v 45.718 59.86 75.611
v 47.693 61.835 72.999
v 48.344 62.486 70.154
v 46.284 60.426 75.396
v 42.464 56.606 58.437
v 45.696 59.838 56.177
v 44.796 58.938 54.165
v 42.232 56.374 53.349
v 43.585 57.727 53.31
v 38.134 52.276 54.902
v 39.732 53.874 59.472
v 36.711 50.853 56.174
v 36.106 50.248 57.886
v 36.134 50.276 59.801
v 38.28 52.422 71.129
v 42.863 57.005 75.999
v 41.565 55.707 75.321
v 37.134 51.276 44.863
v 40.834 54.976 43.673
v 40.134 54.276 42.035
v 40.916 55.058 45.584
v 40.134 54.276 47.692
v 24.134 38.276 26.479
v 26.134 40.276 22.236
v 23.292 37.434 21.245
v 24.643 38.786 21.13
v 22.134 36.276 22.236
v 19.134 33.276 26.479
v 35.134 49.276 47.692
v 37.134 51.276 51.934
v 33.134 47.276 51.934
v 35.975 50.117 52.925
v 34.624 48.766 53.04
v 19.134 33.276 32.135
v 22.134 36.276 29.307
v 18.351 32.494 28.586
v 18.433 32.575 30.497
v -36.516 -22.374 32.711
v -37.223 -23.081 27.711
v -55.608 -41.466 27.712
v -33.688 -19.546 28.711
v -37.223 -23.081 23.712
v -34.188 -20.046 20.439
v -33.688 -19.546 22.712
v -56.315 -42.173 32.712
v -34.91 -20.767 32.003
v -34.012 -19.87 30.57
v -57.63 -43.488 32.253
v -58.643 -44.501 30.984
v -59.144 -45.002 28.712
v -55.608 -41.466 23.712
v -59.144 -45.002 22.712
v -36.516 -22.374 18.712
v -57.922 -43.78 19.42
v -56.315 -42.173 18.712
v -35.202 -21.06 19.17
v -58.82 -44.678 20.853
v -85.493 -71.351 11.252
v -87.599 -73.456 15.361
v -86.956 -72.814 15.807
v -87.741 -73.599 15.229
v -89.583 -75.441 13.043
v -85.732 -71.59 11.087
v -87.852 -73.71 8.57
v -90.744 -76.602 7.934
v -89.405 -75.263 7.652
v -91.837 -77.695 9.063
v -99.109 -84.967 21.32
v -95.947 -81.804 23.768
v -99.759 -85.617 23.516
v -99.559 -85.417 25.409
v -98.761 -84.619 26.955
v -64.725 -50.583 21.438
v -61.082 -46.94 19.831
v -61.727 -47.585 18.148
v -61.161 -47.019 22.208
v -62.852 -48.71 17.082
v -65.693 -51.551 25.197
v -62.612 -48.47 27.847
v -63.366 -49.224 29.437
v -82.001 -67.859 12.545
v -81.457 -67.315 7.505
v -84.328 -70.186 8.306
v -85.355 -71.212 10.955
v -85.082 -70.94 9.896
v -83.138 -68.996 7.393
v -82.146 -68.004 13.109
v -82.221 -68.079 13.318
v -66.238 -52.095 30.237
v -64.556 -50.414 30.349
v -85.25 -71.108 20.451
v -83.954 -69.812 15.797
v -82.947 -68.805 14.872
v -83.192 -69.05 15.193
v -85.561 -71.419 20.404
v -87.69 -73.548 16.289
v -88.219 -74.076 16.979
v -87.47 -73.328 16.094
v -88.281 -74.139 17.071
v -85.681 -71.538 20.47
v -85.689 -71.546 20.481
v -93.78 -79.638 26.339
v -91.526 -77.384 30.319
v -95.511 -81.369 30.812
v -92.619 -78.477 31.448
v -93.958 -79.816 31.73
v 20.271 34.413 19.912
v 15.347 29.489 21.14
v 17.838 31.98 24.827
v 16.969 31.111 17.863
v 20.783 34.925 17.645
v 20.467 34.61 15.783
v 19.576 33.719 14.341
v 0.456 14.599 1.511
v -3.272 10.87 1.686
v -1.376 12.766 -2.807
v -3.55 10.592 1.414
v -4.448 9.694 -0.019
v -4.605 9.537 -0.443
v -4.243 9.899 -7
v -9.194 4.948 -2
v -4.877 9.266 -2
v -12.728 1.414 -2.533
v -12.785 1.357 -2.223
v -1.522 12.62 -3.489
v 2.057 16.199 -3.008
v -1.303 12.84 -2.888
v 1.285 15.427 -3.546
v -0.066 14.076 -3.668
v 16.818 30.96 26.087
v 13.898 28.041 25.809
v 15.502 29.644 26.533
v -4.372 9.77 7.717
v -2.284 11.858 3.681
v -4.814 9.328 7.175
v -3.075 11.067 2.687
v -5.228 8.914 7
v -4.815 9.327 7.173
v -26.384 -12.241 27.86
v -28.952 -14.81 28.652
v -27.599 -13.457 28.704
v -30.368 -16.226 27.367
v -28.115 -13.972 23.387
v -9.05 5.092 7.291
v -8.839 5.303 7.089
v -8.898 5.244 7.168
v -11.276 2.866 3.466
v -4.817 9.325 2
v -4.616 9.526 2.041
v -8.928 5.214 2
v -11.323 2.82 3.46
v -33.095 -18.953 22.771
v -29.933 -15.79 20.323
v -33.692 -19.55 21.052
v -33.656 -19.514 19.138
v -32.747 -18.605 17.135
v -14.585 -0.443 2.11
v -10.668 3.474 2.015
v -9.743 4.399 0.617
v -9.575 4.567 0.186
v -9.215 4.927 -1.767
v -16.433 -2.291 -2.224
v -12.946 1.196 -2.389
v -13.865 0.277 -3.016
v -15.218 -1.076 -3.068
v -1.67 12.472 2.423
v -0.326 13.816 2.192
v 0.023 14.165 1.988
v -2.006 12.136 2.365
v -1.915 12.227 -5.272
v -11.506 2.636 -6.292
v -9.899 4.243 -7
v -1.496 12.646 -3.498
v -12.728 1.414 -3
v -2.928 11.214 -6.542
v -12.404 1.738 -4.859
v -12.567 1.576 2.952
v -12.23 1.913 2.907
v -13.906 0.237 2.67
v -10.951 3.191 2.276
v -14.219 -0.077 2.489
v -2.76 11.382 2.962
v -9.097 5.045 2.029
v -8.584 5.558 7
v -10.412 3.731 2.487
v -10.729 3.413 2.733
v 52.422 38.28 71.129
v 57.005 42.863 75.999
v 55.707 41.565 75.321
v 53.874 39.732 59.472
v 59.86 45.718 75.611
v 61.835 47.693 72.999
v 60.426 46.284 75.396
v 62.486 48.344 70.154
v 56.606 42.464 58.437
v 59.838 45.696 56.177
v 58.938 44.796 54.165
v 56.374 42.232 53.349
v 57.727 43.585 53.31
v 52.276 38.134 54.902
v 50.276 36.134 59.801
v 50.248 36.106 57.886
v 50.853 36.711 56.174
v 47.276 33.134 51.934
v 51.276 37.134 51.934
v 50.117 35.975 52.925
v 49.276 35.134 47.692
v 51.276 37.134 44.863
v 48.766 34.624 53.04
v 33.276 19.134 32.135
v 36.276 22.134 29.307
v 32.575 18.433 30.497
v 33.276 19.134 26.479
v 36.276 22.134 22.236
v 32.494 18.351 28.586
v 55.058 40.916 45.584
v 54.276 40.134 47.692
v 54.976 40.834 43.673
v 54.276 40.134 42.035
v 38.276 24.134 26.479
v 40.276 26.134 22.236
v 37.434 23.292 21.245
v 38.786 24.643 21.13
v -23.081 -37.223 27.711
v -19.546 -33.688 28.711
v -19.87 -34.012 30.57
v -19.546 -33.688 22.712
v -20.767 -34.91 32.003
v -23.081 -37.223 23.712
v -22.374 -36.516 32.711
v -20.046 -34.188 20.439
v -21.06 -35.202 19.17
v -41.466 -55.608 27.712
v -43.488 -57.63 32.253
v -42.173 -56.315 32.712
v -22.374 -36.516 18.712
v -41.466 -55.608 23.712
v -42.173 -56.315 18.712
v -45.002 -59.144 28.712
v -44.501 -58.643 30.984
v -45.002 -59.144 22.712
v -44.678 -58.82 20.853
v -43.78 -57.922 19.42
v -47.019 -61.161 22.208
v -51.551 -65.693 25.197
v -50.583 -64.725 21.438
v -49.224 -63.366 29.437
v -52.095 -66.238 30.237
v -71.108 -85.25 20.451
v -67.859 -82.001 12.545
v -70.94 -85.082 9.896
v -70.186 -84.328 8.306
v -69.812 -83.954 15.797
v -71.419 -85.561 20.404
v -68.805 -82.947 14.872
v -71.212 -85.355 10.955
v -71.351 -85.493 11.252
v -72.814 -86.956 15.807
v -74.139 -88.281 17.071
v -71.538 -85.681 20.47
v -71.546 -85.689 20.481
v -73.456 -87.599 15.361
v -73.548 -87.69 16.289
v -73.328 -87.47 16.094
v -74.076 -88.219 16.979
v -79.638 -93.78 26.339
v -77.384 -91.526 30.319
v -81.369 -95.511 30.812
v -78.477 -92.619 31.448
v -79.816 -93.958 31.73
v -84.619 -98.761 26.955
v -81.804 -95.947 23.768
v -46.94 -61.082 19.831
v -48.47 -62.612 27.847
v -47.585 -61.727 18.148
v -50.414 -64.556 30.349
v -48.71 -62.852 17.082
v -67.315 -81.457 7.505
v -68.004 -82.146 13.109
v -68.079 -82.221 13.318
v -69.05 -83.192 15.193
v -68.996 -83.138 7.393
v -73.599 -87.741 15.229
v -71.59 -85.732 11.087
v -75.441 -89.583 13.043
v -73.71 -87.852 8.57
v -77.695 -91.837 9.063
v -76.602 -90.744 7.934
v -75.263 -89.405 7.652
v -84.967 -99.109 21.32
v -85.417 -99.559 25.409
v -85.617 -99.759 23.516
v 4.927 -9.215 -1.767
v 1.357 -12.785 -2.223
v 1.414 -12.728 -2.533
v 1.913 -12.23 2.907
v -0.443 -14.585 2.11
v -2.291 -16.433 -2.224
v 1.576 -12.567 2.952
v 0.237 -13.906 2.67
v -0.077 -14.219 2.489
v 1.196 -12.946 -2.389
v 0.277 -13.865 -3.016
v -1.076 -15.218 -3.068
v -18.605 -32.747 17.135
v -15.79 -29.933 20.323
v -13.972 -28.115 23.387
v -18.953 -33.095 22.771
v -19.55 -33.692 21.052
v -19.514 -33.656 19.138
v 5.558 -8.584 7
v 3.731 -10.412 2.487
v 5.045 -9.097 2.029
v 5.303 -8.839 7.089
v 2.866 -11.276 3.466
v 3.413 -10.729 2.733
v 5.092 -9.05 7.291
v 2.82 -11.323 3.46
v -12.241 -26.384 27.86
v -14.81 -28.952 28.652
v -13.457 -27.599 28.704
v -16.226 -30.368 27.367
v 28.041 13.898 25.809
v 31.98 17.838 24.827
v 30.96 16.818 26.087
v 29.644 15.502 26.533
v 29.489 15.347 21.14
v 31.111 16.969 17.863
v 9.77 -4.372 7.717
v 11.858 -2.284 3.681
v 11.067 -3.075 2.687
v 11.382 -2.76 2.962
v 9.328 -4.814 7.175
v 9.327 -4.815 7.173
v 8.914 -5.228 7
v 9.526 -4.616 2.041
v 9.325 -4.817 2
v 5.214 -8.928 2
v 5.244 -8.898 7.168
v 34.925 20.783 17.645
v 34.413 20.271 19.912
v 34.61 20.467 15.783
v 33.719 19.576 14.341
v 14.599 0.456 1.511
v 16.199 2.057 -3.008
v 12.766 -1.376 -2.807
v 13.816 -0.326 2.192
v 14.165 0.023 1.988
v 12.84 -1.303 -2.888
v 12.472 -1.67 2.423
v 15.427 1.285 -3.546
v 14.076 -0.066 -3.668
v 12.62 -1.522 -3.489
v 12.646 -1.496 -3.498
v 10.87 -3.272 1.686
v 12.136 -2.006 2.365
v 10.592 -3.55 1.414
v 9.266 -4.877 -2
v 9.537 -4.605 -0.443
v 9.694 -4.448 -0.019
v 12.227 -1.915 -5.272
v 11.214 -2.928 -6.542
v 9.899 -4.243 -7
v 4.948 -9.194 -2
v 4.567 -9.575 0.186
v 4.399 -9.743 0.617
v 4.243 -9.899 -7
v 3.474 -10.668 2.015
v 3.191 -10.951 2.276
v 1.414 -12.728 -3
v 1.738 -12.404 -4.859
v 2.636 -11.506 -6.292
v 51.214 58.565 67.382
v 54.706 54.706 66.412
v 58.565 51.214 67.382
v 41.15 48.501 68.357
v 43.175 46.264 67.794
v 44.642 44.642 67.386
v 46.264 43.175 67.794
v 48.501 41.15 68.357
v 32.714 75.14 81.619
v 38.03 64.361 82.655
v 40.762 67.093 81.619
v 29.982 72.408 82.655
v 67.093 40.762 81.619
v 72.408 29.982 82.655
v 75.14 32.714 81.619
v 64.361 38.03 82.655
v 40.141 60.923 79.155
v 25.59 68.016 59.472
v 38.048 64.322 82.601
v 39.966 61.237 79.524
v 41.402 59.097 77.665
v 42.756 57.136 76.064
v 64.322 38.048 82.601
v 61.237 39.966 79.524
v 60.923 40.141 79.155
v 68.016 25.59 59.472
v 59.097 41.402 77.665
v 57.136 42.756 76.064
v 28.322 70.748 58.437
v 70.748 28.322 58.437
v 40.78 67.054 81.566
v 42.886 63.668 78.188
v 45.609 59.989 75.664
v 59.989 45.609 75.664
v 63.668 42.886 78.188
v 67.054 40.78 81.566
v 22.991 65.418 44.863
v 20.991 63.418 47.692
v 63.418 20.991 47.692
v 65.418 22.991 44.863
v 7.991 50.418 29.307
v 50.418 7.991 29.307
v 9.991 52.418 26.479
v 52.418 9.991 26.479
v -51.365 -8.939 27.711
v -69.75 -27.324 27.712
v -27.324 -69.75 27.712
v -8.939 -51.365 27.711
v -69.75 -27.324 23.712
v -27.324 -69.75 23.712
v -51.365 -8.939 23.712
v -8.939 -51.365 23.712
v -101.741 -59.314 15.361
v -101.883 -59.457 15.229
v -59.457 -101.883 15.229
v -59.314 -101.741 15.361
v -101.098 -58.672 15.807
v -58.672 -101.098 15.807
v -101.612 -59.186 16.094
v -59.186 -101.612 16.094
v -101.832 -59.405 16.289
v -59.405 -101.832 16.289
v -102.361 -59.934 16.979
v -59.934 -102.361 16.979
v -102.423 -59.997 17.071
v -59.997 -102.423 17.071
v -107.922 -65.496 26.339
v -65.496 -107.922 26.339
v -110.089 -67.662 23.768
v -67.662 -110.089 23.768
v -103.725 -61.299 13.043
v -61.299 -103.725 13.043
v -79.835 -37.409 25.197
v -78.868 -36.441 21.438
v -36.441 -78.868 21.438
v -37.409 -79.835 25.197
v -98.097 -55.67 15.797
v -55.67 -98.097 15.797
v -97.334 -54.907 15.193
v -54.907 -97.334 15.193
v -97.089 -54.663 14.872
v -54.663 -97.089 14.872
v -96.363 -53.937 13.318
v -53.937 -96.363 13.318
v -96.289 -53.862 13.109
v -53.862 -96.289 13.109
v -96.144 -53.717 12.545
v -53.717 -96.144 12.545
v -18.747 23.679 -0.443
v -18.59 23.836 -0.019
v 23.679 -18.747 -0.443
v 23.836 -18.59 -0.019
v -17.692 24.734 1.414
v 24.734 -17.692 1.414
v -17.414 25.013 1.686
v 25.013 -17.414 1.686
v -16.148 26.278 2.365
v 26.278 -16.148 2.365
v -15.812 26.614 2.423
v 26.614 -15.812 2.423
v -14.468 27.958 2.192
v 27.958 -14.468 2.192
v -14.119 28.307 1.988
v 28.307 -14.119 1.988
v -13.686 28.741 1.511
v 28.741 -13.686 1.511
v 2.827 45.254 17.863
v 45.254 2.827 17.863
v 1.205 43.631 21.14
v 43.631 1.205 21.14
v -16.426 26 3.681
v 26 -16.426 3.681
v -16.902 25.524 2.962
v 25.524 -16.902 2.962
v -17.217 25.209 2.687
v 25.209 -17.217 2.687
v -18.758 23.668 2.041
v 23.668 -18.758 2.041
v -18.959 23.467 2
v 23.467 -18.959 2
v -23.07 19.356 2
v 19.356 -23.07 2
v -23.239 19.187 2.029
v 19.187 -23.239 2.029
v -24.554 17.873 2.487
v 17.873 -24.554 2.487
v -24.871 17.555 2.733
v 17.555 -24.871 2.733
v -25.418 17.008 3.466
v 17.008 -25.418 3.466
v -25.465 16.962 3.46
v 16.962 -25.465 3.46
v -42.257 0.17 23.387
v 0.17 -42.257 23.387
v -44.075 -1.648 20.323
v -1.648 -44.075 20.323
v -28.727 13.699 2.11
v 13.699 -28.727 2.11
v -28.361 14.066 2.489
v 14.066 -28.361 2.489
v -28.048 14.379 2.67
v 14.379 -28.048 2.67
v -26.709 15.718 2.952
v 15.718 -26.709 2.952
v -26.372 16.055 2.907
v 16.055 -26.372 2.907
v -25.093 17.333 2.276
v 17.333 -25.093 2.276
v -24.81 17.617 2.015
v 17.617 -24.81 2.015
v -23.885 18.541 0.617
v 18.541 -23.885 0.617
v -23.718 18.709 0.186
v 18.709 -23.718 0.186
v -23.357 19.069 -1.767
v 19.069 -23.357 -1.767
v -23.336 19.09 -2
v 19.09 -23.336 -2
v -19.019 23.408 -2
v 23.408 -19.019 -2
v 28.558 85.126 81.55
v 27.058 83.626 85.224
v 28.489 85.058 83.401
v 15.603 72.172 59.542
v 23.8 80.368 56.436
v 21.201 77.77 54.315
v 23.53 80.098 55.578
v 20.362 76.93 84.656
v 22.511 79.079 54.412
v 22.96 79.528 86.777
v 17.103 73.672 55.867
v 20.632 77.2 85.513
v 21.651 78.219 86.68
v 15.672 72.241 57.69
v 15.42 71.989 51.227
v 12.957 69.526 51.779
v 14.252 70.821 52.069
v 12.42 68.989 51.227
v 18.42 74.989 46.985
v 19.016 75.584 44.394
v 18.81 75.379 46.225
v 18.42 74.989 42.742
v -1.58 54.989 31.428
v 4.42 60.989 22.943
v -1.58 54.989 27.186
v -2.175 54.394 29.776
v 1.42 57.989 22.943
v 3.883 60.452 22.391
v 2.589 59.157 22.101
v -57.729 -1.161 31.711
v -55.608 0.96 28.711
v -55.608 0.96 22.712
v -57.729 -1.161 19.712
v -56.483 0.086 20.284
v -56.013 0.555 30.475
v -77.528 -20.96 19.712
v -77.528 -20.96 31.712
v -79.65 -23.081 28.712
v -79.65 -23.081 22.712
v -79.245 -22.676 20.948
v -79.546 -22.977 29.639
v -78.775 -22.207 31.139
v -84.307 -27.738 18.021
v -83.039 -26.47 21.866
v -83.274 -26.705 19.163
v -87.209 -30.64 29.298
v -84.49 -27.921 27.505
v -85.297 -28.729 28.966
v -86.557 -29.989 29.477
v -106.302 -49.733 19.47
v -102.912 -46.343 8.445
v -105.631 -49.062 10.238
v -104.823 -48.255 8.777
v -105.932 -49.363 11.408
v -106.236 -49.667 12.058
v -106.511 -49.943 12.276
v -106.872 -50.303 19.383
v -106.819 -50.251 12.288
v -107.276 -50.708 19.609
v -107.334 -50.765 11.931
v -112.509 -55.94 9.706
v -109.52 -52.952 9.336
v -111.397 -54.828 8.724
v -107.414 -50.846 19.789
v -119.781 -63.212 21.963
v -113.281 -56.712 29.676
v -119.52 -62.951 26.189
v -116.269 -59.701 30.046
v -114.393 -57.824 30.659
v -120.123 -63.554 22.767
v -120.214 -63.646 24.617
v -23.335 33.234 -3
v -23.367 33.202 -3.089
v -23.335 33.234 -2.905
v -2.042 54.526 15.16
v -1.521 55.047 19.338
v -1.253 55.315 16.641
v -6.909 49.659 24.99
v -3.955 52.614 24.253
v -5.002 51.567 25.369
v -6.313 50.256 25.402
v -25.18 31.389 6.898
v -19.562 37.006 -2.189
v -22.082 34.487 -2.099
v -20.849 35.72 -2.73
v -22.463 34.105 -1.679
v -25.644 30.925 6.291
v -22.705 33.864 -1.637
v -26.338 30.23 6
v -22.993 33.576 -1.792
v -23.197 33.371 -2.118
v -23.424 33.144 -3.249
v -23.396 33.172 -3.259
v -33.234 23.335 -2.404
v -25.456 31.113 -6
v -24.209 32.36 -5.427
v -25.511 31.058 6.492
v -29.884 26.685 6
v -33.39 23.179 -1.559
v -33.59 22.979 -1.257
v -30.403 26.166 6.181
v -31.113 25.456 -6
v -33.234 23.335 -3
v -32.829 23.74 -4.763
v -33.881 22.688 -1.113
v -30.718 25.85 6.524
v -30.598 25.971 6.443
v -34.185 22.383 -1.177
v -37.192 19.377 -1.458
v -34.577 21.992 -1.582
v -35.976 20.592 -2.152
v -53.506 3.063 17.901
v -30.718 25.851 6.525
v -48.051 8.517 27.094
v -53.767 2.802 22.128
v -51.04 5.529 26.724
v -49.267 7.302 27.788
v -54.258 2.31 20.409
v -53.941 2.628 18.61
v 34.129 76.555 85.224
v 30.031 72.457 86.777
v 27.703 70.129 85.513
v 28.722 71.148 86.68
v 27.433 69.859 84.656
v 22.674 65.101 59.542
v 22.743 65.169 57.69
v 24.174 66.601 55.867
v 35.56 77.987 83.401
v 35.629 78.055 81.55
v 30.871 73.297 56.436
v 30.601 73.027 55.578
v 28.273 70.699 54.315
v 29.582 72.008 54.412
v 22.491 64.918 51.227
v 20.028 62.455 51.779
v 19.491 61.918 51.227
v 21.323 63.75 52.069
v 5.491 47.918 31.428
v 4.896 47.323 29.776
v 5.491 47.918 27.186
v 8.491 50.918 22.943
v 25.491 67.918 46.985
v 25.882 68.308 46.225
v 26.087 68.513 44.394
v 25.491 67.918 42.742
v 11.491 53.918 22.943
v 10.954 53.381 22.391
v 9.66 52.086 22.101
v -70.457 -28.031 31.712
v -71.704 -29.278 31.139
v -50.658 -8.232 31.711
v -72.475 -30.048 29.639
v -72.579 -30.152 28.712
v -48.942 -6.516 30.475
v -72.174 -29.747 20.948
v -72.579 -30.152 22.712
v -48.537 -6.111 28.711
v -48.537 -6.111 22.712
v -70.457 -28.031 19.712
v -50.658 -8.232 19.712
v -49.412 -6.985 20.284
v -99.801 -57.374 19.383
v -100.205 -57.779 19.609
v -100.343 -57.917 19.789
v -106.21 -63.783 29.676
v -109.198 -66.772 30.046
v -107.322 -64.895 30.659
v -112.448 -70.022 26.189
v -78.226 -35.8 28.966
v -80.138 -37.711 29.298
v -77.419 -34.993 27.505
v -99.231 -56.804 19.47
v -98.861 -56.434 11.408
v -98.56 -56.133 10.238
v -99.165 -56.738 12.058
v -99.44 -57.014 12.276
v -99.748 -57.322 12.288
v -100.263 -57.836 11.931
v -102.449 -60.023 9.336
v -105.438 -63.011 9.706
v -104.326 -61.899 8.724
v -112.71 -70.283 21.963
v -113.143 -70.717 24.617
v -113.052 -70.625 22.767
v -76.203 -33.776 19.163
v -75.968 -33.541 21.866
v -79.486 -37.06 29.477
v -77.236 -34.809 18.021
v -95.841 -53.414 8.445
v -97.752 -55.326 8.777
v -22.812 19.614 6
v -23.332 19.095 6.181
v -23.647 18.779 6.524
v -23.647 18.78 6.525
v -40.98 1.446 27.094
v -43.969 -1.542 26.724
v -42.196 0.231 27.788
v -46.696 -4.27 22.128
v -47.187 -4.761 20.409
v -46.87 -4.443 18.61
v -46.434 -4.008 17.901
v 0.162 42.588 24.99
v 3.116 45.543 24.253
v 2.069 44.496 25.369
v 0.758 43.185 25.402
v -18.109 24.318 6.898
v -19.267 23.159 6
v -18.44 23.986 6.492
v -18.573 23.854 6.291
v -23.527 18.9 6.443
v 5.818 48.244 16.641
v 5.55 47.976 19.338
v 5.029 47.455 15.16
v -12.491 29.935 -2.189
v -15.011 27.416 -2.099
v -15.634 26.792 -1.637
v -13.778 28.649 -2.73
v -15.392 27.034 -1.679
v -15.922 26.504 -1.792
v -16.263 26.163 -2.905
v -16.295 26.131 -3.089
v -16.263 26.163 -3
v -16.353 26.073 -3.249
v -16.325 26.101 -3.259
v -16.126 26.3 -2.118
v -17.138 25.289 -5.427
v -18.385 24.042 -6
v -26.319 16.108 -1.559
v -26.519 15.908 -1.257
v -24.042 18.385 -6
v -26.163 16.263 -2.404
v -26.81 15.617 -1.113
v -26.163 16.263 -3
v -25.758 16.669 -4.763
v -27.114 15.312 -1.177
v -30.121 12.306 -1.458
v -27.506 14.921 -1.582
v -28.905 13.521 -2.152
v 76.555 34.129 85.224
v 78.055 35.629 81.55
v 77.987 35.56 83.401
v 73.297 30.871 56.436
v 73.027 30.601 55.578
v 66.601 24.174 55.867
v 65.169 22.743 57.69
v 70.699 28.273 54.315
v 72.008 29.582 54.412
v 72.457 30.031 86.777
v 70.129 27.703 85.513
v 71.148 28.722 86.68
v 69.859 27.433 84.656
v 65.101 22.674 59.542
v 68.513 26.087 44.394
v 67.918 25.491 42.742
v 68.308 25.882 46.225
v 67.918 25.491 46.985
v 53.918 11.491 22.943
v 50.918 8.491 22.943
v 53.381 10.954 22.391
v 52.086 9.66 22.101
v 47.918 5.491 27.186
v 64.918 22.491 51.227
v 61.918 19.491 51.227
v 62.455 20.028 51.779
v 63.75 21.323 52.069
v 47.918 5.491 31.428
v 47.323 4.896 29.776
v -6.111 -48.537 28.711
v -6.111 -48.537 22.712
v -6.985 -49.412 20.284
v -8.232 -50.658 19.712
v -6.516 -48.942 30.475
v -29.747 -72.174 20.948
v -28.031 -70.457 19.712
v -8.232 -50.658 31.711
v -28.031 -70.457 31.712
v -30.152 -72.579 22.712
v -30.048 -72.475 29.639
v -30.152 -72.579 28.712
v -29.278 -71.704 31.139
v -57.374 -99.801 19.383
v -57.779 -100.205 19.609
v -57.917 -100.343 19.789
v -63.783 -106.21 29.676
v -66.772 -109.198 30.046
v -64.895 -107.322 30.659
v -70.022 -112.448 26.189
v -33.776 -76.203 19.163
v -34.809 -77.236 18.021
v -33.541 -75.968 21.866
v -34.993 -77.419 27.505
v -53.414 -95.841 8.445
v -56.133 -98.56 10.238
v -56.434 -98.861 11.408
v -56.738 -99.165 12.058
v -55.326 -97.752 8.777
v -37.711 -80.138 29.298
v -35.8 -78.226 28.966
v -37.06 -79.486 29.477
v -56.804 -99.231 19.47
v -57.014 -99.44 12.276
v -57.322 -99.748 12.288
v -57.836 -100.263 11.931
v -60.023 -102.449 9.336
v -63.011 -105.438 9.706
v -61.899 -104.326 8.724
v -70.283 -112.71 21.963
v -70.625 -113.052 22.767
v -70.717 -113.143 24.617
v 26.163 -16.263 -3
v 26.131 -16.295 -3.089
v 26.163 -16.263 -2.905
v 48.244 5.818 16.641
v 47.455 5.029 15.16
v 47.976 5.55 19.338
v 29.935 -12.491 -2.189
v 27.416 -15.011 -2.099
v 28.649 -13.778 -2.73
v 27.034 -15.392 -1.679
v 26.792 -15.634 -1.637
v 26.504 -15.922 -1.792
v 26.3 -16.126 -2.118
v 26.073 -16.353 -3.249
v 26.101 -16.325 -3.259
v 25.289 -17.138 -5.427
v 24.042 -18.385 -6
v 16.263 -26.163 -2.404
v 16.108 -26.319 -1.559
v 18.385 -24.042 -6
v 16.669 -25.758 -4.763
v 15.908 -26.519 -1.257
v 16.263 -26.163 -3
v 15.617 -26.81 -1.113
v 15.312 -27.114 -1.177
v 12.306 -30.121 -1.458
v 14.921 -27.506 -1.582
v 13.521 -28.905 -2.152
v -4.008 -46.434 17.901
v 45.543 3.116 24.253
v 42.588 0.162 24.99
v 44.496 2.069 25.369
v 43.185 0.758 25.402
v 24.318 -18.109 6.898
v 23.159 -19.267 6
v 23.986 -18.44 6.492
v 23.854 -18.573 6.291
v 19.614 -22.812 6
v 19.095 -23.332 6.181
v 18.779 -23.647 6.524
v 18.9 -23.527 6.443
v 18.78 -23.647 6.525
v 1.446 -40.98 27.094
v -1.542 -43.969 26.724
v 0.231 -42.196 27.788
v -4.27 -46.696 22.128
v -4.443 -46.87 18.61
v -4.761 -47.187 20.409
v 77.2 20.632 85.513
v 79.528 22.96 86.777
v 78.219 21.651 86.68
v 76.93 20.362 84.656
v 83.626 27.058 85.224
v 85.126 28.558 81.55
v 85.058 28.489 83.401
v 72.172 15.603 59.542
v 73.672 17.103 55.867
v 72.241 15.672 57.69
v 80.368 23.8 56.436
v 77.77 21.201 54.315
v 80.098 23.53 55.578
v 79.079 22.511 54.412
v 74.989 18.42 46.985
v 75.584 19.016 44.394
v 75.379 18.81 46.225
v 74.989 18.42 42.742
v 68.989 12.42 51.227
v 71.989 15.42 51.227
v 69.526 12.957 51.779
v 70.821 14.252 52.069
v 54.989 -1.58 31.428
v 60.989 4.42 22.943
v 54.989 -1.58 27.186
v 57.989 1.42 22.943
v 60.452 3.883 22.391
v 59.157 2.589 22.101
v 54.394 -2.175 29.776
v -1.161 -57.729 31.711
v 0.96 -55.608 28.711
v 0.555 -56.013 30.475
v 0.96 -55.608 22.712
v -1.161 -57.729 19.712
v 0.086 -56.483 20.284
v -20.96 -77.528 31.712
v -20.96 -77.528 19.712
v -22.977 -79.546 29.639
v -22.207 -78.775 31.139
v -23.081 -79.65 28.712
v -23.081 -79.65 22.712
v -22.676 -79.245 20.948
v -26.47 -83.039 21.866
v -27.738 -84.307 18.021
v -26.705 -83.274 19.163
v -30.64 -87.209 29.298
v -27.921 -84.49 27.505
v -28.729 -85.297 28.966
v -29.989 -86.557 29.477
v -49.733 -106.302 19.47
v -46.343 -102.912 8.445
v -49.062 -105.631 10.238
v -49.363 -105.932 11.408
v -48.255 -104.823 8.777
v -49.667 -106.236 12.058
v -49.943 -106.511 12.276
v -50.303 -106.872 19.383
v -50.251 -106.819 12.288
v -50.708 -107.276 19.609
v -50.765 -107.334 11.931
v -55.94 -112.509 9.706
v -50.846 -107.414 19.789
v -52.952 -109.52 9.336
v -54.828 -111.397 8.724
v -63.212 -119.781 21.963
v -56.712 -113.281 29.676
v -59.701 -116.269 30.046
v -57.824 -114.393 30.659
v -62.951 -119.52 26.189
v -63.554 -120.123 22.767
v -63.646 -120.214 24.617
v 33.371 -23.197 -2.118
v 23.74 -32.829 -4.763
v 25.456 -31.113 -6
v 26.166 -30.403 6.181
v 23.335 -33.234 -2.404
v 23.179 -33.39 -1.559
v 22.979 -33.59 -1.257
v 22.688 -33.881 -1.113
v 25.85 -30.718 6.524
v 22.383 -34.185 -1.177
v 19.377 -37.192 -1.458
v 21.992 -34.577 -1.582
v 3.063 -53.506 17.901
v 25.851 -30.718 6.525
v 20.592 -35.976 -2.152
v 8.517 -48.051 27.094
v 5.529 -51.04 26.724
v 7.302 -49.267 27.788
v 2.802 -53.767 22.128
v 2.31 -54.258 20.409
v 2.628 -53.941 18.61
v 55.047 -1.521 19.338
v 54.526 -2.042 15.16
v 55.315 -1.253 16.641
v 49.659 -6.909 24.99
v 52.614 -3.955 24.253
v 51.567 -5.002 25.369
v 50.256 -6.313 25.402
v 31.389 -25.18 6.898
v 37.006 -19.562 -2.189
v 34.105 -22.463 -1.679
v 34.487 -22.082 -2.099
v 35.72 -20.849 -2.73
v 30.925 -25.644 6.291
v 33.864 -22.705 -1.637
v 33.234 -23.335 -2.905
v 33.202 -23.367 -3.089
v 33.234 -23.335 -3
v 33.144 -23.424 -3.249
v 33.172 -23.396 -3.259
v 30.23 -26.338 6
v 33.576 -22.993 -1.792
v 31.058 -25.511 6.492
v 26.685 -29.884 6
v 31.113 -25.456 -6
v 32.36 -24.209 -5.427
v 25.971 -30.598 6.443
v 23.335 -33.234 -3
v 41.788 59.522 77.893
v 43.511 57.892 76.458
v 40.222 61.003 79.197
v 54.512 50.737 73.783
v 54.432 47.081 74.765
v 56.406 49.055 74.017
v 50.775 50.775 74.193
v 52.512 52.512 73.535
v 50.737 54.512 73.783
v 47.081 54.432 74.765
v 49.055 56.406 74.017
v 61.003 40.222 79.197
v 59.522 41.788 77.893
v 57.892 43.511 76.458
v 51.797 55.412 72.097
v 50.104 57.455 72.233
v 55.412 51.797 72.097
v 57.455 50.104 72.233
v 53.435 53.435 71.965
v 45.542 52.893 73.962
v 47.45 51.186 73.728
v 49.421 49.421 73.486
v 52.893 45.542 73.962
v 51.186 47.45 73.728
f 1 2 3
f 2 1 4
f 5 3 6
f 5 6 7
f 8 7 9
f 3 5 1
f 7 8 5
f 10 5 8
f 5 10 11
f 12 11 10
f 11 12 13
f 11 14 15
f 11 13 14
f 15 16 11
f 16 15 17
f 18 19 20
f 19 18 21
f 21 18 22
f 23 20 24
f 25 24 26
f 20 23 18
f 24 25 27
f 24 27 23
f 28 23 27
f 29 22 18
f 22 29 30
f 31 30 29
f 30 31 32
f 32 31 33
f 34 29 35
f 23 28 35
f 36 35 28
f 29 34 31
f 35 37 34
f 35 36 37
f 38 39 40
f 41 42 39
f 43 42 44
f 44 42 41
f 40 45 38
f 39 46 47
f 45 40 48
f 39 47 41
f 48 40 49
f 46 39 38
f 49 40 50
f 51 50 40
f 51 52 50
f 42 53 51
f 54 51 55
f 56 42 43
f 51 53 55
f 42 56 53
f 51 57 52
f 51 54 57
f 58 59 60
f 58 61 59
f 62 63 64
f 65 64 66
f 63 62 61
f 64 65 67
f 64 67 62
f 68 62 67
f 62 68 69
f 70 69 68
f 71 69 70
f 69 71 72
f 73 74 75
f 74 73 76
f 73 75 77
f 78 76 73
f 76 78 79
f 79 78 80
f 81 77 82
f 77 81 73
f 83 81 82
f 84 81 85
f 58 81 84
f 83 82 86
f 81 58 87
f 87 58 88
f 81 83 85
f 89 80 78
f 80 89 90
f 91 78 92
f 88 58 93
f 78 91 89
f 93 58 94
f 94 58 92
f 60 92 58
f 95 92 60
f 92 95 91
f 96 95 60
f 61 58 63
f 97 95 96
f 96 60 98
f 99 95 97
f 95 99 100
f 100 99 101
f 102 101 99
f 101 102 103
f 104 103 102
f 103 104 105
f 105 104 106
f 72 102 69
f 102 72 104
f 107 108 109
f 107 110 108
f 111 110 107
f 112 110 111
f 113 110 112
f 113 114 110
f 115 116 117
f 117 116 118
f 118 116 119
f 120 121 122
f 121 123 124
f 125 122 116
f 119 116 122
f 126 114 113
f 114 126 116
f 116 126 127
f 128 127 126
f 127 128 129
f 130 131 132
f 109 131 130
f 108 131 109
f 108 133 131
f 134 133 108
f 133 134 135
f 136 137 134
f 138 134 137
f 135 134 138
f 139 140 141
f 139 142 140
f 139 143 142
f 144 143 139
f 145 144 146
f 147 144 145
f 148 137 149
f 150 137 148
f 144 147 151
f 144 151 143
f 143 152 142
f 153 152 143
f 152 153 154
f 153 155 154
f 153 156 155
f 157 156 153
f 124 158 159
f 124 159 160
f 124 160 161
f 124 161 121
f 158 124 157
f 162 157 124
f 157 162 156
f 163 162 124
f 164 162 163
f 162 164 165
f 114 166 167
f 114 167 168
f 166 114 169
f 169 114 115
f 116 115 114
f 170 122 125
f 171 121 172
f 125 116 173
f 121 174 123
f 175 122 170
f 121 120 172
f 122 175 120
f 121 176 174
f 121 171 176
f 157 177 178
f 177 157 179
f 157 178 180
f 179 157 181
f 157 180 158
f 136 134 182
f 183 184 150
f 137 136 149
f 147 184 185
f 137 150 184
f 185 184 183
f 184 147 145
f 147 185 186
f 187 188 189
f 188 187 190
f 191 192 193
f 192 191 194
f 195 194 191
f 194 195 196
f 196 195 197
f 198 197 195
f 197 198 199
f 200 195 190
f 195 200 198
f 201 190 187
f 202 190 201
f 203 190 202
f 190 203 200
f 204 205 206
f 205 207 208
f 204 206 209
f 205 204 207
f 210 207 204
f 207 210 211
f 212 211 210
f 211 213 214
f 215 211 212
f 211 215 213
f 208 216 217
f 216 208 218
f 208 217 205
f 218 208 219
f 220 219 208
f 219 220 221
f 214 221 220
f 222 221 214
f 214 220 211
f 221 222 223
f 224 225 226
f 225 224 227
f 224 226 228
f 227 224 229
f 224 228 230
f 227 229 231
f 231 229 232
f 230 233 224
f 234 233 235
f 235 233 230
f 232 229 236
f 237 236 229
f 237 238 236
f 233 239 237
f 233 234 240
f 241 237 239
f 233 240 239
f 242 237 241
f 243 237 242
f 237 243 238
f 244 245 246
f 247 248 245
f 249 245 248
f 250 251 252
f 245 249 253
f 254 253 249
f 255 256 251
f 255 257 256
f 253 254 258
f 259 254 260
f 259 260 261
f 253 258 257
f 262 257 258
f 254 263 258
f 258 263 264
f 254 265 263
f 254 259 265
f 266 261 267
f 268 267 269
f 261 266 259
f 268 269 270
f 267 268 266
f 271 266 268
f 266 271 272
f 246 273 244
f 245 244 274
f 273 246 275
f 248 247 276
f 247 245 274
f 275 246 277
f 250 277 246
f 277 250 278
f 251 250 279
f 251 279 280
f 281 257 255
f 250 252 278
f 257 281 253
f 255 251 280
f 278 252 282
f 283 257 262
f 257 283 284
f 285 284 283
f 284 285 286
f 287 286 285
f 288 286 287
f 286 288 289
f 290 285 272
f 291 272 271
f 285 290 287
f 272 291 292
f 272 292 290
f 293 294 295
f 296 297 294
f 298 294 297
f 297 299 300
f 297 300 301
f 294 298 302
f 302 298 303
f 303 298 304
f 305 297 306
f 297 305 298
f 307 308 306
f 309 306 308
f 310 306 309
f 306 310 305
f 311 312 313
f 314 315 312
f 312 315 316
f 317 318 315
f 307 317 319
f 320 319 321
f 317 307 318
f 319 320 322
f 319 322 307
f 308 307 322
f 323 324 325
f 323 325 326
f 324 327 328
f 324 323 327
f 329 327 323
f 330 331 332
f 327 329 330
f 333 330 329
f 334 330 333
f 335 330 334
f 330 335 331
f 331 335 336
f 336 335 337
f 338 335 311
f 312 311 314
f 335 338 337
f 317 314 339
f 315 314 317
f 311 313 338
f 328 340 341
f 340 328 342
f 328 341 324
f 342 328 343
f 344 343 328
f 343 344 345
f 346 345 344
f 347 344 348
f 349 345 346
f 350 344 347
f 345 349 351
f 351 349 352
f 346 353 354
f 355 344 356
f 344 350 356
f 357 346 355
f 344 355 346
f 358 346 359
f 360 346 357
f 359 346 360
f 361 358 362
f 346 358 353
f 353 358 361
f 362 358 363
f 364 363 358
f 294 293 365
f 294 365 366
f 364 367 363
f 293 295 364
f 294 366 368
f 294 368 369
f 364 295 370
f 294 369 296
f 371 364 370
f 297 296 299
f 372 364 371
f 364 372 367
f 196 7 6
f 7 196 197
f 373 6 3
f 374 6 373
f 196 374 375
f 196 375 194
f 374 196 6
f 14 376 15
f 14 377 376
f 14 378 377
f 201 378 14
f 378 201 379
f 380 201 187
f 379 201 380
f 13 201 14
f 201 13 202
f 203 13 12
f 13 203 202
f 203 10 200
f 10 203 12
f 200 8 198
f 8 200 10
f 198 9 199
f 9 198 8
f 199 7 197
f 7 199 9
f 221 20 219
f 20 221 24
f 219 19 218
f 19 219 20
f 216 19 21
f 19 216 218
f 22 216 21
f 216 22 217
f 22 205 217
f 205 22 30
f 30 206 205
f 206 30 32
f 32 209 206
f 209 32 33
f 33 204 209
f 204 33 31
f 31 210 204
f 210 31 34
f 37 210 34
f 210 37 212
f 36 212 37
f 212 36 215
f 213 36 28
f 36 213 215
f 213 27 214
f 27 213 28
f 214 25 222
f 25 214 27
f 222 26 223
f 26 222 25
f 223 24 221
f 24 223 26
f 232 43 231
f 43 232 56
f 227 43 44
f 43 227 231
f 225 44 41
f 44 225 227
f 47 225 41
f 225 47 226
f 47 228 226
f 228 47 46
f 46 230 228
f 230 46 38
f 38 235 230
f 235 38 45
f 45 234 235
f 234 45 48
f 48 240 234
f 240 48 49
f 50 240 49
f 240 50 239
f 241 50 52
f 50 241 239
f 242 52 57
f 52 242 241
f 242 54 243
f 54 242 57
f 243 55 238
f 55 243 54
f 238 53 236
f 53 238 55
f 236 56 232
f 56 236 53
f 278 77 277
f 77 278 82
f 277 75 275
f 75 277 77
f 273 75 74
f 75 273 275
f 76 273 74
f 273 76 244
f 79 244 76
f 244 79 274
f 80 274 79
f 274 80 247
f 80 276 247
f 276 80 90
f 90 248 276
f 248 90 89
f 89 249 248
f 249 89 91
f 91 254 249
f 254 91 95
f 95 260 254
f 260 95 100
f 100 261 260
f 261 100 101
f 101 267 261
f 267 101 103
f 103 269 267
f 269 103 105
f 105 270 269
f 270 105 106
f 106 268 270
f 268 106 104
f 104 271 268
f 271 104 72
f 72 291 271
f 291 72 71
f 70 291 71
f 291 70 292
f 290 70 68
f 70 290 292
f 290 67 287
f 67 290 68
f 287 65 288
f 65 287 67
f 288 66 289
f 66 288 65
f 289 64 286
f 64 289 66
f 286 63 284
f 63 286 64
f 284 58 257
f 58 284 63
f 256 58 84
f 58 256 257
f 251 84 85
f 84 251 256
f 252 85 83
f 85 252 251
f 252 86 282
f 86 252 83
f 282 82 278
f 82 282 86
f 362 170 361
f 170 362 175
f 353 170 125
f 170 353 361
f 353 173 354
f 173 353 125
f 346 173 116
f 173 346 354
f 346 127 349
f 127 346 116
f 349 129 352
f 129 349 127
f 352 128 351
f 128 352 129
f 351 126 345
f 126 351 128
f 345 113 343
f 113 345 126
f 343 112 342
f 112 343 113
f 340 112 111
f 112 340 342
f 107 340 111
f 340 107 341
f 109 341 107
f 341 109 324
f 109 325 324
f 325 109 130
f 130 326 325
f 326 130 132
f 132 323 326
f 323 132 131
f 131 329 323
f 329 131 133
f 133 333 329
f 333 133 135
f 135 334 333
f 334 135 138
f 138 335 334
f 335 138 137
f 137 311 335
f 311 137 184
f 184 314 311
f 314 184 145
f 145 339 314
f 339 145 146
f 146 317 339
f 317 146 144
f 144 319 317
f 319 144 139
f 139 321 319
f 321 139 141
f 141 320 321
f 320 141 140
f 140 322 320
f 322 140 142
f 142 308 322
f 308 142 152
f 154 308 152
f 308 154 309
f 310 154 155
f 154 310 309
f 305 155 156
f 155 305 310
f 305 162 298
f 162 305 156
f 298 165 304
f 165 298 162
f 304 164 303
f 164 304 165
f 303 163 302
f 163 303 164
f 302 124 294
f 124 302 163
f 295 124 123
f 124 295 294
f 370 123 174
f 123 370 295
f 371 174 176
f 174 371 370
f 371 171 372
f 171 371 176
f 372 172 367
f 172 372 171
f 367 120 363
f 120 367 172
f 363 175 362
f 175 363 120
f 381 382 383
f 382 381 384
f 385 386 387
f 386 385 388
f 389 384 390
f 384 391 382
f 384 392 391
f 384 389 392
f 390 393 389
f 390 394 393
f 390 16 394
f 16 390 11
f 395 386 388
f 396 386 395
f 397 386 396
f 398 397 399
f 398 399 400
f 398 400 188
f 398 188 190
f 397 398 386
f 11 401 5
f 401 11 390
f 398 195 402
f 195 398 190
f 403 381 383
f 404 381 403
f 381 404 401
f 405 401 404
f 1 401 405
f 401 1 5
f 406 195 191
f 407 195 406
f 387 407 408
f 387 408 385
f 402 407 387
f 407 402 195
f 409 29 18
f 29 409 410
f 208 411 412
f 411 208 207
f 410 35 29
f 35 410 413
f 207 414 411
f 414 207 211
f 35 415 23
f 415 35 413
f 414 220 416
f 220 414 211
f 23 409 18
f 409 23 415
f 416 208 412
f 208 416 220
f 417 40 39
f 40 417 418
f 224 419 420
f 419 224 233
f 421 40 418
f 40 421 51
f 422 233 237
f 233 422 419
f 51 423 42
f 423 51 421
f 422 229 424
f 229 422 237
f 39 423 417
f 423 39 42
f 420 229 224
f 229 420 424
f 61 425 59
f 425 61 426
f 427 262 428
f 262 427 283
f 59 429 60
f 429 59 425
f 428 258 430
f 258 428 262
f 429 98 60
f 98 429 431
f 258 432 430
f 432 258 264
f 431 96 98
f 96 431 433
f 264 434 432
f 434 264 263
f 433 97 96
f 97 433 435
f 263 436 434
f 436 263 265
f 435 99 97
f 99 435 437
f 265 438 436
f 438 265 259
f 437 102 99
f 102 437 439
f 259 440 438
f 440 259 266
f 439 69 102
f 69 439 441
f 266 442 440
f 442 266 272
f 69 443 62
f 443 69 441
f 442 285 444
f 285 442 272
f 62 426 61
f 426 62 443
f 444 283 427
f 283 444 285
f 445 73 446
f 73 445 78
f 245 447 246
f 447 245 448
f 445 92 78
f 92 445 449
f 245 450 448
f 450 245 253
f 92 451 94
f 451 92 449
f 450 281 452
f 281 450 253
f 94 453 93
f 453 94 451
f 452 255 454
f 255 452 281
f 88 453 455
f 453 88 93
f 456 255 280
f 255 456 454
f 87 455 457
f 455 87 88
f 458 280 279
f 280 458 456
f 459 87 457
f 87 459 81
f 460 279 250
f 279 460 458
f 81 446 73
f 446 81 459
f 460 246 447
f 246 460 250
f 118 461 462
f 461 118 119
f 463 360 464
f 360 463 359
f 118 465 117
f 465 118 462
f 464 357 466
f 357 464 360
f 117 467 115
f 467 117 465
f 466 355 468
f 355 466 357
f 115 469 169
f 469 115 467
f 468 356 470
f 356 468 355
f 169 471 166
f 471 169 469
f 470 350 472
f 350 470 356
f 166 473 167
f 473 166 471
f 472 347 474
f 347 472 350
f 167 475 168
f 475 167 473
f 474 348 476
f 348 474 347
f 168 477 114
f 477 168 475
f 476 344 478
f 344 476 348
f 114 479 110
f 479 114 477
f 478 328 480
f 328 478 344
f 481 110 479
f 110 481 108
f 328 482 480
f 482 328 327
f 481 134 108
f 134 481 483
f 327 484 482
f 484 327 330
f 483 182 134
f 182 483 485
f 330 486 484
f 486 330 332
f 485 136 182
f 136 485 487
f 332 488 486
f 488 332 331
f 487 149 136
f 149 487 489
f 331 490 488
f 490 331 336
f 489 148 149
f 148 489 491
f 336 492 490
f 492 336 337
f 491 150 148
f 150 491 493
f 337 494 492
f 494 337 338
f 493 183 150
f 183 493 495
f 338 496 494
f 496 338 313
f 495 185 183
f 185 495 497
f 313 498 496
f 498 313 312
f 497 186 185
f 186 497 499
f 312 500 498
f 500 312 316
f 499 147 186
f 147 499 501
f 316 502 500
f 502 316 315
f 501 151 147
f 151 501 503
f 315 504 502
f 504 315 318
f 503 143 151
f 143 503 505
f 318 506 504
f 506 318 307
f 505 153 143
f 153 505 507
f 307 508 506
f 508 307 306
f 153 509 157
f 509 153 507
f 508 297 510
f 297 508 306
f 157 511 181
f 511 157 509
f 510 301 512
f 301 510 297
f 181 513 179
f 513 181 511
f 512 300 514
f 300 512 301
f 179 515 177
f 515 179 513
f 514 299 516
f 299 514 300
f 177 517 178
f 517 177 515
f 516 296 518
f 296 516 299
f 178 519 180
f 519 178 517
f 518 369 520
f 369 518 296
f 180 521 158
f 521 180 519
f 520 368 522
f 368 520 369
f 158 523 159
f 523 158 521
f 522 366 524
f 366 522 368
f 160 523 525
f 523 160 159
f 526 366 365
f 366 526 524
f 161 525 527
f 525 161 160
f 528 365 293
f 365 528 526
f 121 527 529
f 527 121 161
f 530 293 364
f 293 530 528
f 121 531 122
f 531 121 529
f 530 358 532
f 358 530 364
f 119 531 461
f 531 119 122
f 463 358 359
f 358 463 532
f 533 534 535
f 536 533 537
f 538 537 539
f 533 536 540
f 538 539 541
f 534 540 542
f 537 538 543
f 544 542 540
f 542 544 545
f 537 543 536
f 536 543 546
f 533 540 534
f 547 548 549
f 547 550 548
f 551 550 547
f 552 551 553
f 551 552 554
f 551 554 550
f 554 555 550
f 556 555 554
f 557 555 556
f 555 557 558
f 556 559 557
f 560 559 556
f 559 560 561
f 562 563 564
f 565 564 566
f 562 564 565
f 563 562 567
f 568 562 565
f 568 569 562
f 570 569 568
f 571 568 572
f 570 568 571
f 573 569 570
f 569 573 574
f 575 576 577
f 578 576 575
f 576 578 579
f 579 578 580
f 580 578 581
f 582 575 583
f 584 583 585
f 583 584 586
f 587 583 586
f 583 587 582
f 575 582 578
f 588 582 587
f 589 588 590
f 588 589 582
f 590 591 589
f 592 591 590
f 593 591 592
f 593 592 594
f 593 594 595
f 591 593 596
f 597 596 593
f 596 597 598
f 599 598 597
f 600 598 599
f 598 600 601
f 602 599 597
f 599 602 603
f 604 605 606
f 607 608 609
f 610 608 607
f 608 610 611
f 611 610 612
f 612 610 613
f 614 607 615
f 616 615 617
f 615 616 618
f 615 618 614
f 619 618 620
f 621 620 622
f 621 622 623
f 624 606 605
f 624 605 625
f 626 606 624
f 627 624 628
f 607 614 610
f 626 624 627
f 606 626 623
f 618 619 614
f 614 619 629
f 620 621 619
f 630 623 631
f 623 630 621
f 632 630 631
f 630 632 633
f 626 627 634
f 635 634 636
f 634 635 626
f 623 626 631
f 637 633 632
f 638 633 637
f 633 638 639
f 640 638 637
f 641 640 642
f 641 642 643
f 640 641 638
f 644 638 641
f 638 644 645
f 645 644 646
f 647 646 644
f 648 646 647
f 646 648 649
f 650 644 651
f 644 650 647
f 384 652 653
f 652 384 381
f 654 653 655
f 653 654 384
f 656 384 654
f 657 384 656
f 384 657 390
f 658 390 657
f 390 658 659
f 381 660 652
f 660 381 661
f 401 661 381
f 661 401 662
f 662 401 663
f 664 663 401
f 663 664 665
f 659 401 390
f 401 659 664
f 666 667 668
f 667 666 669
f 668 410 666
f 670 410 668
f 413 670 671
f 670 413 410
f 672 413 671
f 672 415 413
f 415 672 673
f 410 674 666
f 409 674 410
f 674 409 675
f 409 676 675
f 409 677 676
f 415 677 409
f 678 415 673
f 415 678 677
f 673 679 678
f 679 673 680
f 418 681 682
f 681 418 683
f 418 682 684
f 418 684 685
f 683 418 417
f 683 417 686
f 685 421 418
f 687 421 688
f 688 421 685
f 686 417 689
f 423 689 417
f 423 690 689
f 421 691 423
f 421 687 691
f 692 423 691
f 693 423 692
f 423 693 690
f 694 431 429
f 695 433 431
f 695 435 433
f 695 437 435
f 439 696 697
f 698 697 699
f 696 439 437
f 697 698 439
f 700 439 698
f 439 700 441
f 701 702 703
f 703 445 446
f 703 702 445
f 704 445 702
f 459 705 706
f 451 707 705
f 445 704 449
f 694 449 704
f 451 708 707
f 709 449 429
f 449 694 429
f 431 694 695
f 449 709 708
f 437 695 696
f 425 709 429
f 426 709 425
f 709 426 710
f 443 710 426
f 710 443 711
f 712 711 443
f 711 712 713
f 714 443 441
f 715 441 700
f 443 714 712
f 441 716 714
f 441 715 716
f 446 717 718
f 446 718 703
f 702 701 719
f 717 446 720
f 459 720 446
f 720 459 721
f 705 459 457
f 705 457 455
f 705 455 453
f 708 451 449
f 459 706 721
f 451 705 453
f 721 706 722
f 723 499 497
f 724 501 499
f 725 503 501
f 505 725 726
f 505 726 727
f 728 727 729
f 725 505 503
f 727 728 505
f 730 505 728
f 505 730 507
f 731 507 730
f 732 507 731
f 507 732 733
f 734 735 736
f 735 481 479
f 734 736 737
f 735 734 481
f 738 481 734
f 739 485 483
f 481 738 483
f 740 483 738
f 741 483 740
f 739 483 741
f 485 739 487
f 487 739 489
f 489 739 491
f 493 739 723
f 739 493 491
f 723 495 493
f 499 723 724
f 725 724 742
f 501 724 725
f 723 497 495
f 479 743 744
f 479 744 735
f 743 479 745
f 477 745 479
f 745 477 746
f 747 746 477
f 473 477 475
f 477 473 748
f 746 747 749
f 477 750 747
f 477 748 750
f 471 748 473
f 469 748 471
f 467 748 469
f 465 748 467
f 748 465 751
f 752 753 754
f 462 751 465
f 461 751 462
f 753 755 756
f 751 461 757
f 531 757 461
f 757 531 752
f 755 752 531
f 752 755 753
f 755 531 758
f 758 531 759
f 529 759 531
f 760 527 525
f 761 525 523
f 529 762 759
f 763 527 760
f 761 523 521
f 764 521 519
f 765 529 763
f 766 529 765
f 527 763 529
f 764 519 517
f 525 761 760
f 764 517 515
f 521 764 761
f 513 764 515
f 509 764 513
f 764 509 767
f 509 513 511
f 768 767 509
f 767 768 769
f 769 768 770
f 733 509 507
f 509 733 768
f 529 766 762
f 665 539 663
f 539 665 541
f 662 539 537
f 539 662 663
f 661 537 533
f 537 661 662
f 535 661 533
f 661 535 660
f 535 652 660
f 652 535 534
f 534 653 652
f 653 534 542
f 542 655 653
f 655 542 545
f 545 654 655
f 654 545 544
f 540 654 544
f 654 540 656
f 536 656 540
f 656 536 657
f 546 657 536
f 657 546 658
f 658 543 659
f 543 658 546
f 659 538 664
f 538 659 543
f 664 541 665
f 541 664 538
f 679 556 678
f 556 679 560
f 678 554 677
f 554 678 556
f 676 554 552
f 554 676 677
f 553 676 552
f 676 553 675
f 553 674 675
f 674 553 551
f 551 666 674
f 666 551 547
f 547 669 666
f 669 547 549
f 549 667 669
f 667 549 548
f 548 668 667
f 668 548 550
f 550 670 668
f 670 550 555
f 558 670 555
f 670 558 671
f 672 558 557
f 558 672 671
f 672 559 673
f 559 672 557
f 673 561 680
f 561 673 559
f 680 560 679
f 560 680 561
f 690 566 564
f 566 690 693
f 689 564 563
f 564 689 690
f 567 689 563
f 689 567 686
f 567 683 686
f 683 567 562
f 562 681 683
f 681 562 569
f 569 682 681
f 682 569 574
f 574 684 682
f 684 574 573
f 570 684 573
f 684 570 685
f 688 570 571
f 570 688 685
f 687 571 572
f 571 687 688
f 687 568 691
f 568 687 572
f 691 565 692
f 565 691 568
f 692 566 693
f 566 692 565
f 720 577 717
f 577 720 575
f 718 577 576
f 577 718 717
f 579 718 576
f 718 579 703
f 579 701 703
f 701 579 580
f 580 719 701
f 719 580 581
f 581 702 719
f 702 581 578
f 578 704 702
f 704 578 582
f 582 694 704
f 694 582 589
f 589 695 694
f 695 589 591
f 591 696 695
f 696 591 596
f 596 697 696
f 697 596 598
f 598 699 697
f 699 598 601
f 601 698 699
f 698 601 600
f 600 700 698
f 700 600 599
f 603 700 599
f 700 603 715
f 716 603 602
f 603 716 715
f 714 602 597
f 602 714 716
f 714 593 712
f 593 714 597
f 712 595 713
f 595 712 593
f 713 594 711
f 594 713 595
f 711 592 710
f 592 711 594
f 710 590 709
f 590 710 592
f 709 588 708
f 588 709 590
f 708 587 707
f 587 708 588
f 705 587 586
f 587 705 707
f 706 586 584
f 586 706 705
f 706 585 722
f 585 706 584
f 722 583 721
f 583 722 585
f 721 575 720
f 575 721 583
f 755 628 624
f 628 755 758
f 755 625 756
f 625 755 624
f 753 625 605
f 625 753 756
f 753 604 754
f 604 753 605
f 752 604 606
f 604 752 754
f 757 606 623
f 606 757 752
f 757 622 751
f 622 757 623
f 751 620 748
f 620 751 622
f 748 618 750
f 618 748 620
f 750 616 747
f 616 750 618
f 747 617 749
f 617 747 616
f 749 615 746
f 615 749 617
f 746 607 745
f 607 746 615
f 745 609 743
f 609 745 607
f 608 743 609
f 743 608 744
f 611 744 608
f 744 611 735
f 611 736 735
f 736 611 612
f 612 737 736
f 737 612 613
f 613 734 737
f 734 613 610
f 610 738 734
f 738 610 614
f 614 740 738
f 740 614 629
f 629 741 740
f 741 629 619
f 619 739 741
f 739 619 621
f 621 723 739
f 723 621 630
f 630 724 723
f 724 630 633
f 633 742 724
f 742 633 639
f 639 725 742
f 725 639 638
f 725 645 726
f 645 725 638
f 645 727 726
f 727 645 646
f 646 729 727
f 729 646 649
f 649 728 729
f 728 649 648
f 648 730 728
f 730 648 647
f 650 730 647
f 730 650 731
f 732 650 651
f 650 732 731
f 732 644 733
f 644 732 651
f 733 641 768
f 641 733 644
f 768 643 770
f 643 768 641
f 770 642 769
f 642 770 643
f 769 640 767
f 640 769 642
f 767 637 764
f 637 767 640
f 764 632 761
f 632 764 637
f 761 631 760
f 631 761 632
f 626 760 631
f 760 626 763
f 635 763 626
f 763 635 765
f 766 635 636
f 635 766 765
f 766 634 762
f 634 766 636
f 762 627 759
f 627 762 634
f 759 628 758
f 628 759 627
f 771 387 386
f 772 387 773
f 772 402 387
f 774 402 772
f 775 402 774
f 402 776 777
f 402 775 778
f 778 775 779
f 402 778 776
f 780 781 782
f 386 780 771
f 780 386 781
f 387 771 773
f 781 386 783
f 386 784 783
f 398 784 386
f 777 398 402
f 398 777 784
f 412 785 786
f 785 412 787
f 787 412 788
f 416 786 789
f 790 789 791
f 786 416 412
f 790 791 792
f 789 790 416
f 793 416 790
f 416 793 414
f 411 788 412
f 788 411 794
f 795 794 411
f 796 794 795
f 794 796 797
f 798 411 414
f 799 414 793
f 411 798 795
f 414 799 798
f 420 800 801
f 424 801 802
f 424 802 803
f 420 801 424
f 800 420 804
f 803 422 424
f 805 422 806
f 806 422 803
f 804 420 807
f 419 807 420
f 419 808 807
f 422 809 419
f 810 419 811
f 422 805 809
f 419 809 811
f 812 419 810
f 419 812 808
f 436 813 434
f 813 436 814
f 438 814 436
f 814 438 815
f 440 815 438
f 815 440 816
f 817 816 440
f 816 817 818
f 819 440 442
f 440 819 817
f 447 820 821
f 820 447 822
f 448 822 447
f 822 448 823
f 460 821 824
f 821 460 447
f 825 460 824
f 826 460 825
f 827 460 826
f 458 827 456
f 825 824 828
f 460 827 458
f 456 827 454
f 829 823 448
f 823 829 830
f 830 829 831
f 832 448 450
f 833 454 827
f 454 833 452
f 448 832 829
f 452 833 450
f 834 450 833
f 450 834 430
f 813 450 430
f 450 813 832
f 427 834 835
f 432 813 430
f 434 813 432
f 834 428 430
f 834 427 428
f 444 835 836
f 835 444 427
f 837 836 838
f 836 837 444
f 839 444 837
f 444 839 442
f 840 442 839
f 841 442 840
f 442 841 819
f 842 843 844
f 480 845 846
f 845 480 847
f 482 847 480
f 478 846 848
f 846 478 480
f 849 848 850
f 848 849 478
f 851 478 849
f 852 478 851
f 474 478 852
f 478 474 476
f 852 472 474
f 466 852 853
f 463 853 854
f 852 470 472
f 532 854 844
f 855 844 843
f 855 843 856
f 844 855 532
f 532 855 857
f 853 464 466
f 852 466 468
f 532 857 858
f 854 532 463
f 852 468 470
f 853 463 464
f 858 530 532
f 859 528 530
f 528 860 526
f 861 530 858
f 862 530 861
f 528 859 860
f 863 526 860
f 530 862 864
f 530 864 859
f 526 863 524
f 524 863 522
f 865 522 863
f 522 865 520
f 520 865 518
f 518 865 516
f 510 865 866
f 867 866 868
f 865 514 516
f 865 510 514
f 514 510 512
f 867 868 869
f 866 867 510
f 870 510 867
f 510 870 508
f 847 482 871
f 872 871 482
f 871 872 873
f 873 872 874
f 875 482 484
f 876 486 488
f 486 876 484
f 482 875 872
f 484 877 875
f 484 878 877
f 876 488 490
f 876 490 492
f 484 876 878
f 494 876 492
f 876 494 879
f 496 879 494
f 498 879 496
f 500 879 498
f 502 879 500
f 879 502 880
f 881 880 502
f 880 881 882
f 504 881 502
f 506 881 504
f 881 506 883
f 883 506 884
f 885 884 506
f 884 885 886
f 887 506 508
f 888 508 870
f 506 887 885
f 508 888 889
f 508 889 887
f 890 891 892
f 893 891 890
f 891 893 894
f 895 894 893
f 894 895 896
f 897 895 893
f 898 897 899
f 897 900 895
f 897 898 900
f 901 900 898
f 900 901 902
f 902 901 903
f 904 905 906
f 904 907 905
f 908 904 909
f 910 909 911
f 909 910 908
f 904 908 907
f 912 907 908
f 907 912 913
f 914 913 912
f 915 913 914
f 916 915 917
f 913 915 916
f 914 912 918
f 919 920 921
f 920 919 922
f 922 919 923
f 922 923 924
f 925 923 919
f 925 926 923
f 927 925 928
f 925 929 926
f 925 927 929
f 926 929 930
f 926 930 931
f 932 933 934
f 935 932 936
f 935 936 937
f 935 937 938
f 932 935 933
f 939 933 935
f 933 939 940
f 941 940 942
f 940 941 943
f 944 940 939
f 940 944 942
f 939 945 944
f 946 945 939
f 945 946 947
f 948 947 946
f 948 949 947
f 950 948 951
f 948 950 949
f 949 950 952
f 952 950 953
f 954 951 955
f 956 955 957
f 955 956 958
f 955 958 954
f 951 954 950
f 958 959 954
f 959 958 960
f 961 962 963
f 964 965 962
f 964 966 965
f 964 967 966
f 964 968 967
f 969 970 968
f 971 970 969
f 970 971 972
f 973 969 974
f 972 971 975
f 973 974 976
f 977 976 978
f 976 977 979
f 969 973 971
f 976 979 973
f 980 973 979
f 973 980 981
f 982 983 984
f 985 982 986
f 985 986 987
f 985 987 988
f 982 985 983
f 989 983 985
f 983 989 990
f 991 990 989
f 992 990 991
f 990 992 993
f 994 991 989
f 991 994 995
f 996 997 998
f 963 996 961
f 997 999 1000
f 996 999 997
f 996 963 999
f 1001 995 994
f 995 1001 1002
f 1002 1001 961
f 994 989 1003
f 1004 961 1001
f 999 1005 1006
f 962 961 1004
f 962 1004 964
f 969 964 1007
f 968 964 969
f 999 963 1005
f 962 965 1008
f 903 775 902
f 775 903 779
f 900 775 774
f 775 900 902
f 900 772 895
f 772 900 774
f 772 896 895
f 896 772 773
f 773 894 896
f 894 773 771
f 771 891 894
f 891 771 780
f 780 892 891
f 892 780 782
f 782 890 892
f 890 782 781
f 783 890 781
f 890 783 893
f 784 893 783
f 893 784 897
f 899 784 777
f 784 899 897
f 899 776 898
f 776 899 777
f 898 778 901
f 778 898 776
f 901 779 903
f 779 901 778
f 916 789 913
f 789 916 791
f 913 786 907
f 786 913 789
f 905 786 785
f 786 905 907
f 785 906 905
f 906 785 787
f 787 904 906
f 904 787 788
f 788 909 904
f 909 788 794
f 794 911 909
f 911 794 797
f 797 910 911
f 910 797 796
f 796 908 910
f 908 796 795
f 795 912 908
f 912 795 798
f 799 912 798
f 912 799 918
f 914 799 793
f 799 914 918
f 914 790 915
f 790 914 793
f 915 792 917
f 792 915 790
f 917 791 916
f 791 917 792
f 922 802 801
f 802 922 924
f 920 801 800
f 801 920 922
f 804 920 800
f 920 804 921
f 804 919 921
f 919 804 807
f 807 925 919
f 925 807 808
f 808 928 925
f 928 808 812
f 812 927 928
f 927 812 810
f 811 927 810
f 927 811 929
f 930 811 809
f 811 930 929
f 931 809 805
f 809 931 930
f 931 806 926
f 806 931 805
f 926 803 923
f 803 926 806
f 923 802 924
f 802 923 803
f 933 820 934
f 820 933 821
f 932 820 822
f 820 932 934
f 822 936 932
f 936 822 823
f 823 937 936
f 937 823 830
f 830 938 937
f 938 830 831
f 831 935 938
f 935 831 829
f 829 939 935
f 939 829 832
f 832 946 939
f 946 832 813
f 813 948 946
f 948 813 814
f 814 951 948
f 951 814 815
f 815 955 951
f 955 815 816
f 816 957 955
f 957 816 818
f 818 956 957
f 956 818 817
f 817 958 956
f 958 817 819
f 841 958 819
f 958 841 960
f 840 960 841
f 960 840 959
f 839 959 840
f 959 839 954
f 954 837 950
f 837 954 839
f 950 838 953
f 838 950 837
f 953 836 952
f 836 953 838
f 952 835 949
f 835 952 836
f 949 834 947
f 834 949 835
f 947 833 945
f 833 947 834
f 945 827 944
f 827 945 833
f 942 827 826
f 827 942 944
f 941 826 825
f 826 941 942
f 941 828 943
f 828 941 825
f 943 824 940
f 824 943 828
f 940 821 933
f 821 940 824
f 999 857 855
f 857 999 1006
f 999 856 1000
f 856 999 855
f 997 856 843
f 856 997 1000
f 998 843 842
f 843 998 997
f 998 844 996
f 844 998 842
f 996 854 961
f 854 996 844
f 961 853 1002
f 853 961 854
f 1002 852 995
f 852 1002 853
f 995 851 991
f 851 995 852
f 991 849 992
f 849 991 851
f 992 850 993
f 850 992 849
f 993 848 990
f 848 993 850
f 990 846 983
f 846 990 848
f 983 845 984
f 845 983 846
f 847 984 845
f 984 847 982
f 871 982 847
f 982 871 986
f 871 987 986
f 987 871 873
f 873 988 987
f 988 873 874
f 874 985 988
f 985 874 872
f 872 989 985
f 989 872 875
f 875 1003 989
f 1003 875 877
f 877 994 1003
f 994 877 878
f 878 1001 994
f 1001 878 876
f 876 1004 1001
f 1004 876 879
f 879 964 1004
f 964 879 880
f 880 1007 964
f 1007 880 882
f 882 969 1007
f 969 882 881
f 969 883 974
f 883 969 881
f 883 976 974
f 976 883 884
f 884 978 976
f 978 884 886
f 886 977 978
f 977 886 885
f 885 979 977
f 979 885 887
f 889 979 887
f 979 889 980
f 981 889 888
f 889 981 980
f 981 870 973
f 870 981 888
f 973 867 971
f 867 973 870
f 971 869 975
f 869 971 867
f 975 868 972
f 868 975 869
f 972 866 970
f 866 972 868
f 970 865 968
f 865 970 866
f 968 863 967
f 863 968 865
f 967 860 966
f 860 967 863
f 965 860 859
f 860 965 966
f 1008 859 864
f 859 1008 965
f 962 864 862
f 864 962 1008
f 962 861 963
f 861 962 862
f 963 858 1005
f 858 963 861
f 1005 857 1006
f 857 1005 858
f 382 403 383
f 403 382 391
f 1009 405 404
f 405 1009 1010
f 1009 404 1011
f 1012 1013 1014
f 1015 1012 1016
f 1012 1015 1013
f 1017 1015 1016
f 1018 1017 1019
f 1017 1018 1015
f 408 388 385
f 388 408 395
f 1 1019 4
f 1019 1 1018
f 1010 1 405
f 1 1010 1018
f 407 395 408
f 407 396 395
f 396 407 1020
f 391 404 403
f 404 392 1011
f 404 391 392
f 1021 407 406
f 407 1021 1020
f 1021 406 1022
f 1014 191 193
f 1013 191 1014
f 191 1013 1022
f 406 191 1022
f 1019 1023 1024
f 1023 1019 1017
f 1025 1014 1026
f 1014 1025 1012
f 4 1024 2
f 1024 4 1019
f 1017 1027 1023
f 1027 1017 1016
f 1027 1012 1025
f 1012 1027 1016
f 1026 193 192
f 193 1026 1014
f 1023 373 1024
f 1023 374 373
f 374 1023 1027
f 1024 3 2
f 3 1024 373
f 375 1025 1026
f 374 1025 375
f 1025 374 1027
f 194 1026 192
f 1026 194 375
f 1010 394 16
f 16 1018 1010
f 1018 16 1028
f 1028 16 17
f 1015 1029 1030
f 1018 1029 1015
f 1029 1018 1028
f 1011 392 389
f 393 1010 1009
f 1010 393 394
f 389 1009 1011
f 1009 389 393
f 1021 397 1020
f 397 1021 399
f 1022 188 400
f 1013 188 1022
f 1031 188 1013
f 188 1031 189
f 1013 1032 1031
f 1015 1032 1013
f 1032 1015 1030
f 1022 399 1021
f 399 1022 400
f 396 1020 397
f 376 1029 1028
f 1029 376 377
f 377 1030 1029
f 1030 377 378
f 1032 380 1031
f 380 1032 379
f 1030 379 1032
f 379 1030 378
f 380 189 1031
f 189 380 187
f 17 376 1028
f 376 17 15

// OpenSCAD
//translate([-30,60,15])rotate([90,0,0])linear_extrude(50,center=true) color("black") offset(2)offset(-4)offset(2){
//    
//    square([200,10],true);}
//translate([-30,-60,15])rotate([90,0,0])linear_extrude(50,center=true) color("black") offset(2)offset(-4)offset(2){
//    
//    square([200,10],true);}
 rotate(45)difference(){
    
    union(){
 color("tan")   rotate([90,0,0])linear_extrude(20,center=true,convexity=10) color("black") offset(4)offset(-4)offset(2)  shape(); 
 color("yellow")   rotate([90,0,0])linear_extrude(70,center=true,convexity=10) color("black") offset(-1)offset(-4)offset(2)  shape(); 
        
  color("tan")  translate([0,35,0]) rotate([90,0,0])linear_extrude(10,center=true,convexity=10) color("black") offset(3)offset(-4)offset(2)  shape();        
 color("tan")  translate([0,-35,0]) rotate([90,0,0])linear_extrude(10,center=true,convexity=10) color("black") offset(3)offset(-4)offset(2)  shape(); 
        }
    
 {

 color("tan") for(a=[0:1/10:1])
   translate([72,0,70]) 
      rotate([0,sin(a*360)*60+15,0])translate([0,0,29])rotate([0,90,0])cylinder(100,25,25,center=true);

}}

     module shape()  {square([12,10],true);
union()                                                                  {
translate([5,0])rotate(35){
    translate([20,0]) square([34,10],true);
translate([40,0])rotate(10){
    translate([20,0]) square([32,10],true);
translate([40,0]) rotate(30){
    translate([20,0]) square([30,10],true);
    
    
}   
    
}    
    
}
    }
union()                                                                  {
translate([-5,0])rotate(180-40){
    translate([20,0]) square([34,10],true);
translate([40,0])rotate(40){
    translate([20,0]) square([32,10],true);
translate([40,0]) rotate(20){
    translate([20,0]) square([32,10],true);
    
 translate([40,0]) rotate(-70){
    translate([10,0]) square([20,10],true);
    
    
}   
}   
    
}    
    
}
    }                   }
